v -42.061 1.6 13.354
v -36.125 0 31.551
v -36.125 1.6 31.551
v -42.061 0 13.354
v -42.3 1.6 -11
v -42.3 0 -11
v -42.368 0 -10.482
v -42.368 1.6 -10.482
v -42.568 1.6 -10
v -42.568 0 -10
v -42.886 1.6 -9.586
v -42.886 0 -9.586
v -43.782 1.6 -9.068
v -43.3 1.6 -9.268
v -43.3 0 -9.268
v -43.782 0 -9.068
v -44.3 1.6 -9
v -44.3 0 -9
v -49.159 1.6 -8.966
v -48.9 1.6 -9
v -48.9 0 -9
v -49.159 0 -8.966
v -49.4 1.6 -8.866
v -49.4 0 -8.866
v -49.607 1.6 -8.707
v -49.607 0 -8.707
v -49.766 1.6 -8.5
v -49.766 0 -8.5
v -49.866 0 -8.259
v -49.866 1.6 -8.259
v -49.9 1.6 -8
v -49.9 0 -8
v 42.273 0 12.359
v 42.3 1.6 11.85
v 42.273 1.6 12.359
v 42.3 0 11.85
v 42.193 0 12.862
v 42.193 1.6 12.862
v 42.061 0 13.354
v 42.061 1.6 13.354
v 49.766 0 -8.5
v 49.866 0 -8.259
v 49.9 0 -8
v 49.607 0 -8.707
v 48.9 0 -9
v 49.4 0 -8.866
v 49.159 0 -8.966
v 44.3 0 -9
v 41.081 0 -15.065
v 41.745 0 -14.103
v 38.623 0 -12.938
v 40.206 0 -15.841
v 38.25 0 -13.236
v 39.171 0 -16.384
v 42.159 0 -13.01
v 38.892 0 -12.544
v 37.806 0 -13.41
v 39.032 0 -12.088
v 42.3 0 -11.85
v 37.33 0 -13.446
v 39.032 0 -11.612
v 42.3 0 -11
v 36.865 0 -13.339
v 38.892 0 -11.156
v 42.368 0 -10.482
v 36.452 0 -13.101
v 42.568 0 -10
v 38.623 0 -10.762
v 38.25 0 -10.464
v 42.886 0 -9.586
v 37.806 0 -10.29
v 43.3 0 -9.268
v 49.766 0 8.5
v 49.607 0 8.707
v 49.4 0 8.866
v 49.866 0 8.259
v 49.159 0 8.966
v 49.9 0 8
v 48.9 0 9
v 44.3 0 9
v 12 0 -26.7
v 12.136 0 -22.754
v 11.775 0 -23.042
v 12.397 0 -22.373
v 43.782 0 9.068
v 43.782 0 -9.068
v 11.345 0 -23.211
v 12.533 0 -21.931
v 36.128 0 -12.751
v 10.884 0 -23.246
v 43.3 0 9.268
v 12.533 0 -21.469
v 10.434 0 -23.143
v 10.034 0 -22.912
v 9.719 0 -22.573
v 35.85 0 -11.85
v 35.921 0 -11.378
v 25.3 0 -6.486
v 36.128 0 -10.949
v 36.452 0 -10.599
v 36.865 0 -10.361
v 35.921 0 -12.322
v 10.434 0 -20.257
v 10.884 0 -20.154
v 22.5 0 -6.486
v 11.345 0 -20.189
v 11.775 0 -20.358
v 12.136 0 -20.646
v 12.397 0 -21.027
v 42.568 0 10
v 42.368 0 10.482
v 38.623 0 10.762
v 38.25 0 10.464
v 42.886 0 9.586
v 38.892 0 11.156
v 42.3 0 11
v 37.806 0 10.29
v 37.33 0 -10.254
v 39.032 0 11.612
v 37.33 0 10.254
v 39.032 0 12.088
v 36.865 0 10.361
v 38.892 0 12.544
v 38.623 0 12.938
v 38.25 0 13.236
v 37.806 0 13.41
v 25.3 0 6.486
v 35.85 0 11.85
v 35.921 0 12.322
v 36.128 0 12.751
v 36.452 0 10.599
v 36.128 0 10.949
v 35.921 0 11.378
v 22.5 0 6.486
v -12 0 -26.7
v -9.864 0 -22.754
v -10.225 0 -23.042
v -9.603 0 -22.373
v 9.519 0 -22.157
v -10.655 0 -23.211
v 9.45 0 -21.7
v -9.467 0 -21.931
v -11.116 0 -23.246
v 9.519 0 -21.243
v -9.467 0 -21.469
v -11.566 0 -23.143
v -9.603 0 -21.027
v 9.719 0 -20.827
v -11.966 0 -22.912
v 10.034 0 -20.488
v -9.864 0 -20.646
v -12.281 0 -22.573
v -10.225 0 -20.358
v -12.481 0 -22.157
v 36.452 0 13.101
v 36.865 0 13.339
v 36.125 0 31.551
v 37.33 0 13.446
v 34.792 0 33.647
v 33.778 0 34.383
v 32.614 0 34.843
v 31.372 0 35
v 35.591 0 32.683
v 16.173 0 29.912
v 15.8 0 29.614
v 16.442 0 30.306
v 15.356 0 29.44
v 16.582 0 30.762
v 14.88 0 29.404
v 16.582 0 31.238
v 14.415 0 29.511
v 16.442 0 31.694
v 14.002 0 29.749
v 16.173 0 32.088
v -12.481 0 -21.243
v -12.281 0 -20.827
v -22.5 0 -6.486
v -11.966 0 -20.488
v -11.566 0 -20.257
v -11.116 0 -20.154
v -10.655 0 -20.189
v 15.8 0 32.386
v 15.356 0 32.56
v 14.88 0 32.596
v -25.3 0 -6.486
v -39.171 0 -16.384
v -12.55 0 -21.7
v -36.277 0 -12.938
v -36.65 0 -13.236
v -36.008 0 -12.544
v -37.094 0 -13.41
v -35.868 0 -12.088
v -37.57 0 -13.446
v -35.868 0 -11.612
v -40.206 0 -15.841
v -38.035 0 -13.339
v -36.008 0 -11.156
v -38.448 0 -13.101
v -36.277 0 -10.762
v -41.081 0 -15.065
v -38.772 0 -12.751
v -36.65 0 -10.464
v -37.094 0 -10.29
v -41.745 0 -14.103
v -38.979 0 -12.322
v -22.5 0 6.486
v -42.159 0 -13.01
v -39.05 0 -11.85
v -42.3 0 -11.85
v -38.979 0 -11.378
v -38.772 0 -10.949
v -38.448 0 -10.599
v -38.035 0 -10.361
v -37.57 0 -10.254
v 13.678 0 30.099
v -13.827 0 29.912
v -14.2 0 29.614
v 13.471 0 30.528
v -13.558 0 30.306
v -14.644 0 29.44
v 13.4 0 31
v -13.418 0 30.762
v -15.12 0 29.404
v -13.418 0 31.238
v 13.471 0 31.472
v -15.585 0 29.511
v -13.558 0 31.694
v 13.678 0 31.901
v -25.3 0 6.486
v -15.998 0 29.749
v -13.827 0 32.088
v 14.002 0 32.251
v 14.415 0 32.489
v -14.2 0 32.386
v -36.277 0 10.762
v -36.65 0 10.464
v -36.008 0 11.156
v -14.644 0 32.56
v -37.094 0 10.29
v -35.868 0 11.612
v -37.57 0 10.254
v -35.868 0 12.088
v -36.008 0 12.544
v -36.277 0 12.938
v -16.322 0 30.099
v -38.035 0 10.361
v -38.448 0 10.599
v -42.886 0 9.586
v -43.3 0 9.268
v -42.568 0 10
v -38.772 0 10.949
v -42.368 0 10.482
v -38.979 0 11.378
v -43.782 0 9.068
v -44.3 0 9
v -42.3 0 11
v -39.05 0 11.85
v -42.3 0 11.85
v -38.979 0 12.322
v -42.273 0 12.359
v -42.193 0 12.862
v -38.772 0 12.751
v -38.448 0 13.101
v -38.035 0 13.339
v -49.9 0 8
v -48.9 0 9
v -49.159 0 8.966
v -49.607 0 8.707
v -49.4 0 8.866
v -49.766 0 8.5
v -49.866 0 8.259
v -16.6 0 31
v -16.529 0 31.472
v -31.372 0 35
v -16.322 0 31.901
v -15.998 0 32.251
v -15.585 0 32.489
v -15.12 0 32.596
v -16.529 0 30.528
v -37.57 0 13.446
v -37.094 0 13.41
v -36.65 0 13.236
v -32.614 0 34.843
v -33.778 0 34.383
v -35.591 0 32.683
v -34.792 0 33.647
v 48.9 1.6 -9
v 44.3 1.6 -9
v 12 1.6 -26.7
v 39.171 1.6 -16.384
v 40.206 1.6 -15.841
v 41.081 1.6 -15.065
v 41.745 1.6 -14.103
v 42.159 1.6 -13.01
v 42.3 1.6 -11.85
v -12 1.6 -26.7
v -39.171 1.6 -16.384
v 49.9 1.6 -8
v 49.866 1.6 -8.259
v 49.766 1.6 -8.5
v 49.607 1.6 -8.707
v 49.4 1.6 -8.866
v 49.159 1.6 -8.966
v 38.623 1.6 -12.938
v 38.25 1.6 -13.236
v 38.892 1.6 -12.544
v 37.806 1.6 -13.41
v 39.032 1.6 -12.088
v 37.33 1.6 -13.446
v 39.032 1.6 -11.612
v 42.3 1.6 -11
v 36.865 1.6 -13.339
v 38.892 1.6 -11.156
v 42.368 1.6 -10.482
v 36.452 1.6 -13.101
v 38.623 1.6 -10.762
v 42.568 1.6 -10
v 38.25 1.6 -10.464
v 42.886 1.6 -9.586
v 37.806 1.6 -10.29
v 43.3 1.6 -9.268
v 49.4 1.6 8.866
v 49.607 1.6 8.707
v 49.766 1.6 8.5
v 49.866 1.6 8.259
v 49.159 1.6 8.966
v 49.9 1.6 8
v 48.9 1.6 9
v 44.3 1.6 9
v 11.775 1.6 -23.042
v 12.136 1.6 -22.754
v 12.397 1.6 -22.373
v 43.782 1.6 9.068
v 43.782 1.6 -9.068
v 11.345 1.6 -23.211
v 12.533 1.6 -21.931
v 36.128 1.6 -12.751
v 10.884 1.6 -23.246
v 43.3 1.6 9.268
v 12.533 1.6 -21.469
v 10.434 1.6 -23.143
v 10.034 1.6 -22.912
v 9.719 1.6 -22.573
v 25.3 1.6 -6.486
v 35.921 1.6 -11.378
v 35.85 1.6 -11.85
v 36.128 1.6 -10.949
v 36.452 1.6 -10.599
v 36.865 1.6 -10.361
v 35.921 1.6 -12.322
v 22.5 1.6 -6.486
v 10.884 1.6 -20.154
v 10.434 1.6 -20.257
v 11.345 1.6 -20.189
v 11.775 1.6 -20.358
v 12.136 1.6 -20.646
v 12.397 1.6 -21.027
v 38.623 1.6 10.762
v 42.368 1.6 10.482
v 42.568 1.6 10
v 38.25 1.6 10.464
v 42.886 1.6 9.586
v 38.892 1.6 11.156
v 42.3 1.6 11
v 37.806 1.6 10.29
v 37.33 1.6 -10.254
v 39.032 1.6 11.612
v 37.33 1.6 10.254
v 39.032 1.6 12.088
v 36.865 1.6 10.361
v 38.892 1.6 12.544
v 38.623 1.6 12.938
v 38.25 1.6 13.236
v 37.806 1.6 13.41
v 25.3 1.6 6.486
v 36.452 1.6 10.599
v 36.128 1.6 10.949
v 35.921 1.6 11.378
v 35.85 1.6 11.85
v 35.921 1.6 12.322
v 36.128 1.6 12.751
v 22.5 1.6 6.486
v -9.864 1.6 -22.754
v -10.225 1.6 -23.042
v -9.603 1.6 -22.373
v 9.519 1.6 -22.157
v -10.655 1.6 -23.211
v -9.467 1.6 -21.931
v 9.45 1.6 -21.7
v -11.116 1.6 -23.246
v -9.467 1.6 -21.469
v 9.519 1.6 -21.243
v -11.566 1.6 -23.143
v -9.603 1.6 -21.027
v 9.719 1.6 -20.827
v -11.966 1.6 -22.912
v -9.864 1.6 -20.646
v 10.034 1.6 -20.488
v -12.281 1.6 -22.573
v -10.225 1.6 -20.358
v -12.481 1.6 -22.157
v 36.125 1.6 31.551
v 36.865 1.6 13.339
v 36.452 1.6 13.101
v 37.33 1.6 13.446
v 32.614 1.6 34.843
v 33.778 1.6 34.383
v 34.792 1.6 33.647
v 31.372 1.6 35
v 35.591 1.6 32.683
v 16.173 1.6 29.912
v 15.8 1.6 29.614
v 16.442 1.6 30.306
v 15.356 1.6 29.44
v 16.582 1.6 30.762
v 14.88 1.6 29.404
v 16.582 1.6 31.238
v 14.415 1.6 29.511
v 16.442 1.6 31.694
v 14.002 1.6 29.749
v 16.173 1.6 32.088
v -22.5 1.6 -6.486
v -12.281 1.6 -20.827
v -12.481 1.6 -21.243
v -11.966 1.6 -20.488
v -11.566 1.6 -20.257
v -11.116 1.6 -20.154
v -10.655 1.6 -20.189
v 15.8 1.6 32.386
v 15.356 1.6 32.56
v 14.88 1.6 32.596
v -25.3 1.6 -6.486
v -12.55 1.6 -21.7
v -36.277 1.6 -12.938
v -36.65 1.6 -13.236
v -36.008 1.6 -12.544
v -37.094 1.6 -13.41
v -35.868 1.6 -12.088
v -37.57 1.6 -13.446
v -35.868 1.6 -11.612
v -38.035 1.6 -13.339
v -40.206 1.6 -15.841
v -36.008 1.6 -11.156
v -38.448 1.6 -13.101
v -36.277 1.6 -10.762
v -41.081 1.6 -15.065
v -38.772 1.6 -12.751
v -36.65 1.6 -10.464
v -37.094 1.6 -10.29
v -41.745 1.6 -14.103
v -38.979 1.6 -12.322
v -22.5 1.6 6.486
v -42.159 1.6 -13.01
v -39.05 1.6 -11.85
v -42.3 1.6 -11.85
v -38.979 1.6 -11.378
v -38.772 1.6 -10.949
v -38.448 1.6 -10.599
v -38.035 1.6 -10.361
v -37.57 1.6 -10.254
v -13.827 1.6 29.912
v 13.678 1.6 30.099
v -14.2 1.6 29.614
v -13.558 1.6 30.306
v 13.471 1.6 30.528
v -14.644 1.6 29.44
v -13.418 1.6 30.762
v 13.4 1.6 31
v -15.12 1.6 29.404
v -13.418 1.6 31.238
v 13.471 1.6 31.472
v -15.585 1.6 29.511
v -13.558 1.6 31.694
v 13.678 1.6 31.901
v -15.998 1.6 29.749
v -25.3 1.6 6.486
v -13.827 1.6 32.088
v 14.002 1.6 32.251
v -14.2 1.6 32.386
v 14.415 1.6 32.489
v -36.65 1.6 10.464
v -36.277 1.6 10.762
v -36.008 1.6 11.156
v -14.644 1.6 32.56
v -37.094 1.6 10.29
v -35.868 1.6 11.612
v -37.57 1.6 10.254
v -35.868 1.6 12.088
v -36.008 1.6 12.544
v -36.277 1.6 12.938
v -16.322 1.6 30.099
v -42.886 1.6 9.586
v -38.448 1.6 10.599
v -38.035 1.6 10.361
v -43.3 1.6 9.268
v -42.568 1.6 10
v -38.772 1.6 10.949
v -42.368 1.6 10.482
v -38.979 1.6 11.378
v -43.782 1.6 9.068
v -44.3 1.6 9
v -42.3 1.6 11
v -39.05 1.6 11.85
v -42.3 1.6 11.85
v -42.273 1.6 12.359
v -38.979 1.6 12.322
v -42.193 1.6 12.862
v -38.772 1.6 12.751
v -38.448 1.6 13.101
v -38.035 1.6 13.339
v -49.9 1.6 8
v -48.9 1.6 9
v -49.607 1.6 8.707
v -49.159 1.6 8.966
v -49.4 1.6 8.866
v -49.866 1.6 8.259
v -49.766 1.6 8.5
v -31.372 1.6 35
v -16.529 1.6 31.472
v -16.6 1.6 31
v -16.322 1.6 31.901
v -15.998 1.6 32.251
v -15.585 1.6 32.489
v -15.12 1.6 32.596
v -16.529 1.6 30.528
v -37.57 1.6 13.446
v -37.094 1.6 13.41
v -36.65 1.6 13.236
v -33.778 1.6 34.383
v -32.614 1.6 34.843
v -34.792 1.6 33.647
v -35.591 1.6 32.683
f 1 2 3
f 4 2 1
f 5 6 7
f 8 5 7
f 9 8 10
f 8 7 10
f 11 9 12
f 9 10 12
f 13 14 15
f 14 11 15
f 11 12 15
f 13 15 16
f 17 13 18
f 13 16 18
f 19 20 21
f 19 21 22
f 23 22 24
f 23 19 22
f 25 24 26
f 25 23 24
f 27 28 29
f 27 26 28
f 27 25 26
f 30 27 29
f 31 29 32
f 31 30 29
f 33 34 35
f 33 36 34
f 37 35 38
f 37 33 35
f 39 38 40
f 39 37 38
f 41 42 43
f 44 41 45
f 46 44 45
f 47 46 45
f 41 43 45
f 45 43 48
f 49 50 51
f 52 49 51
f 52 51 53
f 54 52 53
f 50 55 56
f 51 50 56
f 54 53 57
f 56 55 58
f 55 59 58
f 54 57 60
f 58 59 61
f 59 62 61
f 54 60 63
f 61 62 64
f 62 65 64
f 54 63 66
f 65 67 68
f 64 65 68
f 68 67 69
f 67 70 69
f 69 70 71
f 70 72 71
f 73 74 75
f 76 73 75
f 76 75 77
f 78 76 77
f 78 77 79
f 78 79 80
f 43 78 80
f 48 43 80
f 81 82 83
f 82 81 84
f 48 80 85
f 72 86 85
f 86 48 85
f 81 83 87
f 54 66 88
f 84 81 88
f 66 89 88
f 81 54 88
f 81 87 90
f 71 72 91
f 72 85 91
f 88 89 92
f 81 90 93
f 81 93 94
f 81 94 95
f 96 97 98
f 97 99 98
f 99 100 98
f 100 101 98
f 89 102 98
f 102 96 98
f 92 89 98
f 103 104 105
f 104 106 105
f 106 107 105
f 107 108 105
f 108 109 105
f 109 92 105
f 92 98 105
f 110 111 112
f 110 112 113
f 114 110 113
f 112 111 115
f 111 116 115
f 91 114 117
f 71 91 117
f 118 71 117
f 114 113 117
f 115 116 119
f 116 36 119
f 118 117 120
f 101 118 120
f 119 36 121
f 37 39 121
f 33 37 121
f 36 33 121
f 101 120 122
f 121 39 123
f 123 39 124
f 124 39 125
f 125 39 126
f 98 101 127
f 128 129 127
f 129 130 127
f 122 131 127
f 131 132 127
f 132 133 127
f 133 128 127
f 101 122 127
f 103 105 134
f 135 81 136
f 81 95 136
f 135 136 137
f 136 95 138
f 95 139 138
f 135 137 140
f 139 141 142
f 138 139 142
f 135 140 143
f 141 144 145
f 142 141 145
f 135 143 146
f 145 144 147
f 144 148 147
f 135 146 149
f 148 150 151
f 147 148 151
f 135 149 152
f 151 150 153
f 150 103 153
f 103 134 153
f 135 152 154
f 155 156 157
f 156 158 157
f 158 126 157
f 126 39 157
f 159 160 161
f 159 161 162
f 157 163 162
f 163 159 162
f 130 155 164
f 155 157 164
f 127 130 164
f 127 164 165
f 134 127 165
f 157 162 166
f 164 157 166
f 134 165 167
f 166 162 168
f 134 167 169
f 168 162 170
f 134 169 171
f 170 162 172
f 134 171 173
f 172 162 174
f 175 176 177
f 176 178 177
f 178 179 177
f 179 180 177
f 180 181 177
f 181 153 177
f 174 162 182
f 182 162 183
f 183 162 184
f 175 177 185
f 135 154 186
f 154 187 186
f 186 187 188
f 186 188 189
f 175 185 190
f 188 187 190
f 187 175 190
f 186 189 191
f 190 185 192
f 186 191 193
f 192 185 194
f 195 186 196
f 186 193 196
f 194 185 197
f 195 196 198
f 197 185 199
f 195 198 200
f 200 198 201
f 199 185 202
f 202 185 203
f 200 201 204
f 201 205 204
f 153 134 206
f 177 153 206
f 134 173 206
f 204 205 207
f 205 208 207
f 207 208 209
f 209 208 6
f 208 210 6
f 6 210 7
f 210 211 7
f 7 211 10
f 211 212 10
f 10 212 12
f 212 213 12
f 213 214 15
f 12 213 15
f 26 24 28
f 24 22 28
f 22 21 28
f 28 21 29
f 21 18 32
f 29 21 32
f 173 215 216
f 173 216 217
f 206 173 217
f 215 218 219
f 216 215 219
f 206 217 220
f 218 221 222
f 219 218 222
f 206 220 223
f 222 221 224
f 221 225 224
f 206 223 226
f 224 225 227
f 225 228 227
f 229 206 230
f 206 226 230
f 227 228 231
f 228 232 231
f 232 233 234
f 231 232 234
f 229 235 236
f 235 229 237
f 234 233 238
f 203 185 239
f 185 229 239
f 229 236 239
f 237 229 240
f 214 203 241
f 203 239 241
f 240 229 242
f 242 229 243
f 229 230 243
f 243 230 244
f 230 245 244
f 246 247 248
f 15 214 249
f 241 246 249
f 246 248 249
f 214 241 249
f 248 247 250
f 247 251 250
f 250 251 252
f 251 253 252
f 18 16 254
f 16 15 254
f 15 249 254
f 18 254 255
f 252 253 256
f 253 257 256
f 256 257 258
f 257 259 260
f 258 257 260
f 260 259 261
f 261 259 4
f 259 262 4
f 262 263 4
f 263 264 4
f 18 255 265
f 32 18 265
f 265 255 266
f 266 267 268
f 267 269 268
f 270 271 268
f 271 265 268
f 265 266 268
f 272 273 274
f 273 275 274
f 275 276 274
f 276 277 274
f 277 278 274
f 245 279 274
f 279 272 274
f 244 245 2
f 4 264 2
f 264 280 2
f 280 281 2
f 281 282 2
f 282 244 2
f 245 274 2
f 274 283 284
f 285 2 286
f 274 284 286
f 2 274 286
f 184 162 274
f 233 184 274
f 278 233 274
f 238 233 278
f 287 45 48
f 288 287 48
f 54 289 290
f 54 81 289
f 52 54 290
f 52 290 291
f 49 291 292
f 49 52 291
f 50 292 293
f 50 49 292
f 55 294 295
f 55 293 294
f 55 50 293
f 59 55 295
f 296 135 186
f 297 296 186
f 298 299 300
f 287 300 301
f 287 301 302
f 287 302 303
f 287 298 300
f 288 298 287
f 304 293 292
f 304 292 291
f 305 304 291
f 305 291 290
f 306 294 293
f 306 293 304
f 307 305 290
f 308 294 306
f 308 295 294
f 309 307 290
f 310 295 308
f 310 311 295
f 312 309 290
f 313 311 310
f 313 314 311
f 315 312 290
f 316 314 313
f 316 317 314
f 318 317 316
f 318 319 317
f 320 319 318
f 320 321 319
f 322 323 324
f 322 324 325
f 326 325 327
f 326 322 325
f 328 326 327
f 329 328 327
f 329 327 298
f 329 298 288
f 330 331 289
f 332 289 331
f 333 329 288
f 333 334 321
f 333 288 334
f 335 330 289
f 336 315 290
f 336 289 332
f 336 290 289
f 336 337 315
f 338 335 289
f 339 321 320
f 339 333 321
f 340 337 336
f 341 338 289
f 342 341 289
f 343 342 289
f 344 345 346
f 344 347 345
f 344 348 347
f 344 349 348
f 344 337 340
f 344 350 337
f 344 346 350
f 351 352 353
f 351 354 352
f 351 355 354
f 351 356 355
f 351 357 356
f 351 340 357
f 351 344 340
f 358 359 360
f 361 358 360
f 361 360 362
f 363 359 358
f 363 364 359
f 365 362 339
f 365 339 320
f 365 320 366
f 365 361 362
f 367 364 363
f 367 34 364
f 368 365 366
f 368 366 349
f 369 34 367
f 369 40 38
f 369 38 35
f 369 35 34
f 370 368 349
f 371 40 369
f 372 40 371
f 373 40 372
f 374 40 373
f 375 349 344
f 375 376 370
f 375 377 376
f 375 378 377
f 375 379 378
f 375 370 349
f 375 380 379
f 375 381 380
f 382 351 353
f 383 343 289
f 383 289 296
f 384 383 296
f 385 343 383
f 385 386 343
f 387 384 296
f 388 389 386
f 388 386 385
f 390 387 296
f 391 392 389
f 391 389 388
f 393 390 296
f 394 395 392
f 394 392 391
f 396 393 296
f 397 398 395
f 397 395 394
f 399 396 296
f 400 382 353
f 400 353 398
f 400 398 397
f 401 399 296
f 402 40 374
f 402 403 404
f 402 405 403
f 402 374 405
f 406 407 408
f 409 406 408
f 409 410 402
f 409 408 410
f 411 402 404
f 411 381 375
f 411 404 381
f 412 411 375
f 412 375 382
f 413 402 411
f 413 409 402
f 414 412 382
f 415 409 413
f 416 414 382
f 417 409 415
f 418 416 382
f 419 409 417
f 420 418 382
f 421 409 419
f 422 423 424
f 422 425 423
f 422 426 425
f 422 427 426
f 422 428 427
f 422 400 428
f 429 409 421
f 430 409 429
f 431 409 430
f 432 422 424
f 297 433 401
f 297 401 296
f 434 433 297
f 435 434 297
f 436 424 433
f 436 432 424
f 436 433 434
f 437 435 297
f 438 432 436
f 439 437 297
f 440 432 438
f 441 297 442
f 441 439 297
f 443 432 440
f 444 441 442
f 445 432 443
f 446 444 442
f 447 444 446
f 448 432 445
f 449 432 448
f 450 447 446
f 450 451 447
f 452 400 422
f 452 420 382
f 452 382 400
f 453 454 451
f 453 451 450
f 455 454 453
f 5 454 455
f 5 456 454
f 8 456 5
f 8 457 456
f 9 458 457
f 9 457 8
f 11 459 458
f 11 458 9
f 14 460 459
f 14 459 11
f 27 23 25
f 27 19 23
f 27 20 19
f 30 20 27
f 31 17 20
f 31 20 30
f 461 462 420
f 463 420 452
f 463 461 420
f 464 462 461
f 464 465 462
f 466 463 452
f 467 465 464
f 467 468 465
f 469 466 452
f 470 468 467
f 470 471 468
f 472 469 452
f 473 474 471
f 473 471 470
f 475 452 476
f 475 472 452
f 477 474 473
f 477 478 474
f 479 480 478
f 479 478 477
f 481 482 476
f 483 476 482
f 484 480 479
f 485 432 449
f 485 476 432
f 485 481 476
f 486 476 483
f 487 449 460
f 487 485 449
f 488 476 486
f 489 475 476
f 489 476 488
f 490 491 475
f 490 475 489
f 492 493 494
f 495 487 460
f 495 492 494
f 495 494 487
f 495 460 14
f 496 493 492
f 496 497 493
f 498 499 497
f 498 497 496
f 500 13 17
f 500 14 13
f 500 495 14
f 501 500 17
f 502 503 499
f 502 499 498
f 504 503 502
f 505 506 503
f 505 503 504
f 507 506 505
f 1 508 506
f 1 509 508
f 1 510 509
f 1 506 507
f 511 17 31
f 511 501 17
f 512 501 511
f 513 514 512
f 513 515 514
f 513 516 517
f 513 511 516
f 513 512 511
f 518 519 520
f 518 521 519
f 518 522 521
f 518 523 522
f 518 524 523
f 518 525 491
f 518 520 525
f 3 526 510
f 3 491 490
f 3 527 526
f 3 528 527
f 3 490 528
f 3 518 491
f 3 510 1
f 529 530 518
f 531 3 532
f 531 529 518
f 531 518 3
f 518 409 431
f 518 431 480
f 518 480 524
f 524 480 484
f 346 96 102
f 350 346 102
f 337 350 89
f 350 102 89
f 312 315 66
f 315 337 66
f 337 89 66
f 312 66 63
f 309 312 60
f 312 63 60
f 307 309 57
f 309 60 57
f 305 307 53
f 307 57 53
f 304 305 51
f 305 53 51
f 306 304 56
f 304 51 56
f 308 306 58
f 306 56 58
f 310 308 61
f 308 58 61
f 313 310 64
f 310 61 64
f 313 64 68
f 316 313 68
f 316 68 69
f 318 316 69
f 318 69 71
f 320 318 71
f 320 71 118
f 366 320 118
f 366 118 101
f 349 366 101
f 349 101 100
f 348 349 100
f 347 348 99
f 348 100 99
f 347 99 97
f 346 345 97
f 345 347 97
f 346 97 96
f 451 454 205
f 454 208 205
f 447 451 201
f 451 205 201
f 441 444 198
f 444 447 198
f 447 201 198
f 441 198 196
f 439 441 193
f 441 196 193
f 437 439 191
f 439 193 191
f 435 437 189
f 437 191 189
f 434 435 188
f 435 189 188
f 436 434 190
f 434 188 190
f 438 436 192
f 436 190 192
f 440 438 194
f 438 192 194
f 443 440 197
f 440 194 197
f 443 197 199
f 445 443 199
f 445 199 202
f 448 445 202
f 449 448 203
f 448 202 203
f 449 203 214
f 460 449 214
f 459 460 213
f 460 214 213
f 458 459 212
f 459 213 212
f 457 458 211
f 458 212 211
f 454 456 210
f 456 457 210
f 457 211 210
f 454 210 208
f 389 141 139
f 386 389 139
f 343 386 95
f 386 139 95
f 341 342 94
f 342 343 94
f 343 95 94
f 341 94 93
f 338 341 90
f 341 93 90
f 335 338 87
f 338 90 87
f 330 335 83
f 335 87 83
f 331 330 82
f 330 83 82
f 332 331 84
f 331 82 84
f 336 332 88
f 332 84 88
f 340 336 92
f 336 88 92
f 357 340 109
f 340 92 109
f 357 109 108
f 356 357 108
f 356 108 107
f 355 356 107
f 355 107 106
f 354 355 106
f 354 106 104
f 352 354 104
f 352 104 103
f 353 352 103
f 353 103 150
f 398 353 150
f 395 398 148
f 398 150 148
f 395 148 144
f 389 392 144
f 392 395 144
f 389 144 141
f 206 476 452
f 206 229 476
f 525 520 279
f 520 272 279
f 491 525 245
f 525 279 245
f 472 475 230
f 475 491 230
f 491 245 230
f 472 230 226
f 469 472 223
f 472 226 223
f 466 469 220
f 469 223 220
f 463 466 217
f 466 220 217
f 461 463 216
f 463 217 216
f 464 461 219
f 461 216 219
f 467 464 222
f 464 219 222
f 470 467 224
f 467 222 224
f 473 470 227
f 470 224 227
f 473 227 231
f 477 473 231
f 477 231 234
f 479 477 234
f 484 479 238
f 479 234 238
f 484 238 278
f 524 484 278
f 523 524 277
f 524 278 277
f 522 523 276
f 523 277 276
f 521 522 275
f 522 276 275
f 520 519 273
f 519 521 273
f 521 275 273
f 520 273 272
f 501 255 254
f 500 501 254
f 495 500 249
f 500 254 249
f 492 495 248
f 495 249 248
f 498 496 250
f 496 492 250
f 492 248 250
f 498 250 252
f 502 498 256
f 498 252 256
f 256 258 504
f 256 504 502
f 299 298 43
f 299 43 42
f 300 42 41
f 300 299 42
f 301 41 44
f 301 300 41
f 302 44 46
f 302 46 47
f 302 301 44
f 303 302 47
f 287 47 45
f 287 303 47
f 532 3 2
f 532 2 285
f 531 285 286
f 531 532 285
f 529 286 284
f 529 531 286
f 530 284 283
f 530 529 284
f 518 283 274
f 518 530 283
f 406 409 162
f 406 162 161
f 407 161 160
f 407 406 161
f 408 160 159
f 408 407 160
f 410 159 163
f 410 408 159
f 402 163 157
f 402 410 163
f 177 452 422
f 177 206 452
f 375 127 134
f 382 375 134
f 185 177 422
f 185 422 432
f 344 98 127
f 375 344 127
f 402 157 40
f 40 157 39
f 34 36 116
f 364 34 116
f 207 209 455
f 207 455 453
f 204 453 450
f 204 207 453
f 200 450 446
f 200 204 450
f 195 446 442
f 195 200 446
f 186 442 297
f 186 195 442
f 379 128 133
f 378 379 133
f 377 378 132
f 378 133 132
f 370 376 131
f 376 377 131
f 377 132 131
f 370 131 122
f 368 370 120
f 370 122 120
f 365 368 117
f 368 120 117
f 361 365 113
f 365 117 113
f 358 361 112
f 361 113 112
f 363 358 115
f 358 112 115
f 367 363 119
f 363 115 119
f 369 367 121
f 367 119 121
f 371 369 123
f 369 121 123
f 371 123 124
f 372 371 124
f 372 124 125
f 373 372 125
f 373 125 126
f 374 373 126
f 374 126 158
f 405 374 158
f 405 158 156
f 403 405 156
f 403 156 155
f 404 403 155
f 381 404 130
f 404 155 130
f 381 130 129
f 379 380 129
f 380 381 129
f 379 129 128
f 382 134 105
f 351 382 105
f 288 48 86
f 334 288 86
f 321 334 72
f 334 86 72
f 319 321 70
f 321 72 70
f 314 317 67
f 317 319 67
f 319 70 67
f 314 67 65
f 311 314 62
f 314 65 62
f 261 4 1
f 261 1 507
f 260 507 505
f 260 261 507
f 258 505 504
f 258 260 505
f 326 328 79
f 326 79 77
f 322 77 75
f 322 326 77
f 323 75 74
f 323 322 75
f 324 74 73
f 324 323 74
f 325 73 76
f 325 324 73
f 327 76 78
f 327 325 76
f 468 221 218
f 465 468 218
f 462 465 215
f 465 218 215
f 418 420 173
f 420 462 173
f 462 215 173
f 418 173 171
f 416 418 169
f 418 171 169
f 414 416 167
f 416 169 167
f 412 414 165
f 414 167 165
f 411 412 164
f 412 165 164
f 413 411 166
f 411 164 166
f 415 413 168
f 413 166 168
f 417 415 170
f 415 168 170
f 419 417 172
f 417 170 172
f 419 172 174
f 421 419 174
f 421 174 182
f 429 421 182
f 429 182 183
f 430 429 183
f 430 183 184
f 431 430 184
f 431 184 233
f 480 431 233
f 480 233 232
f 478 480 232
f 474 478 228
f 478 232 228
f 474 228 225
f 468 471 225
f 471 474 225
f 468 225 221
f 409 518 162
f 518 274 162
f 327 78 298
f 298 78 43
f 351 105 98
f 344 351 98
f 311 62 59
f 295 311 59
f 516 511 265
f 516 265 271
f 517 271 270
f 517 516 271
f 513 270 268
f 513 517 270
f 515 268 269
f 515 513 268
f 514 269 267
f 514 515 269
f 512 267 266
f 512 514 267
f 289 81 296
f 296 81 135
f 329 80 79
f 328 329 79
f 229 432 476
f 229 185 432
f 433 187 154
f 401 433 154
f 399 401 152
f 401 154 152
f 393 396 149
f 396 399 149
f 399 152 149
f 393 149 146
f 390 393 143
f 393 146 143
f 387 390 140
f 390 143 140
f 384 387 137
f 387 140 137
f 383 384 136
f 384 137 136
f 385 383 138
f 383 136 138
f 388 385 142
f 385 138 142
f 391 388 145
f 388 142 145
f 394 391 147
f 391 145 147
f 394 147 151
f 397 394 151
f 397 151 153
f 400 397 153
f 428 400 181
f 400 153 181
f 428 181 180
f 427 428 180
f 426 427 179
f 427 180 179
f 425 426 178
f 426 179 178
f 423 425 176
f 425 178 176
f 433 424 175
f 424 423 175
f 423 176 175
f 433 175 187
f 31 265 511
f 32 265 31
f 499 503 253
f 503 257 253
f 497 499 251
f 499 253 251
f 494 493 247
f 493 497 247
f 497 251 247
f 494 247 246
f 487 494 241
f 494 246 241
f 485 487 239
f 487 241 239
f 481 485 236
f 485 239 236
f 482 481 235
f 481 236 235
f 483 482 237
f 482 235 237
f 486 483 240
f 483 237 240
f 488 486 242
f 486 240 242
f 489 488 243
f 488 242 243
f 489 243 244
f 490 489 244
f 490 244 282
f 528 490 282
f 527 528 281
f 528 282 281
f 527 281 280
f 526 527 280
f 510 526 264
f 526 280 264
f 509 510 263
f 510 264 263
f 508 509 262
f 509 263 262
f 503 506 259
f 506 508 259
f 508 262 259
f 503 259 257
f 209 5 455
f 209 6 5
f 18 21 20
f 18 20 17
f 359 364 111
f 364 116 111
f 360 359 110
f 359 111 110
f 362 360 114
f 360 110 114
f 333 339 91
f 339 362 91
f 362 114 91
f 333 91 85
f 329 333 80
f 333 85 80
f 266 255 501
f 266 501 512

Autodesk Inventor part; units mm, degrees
ref_plane "YZ Plane" through (0, 0, 0) normal (1, 0, 0) x (0, 1, 0)
ref_plane "XZ Plane" through (0, 0, 0) normal (0, 1, 0) x (-1, 0, 0)
ref_plane "XY Plane" through (0, 0, 0) normal (0, 0, 1) x (1, 0, 0)
sketch "Szkic1" plane through (0, 0, 0) normal (0, 1, 0) x (-1, 0, 0)
  circle A0 centre (-37.45, -11.85) radius 1.6
  circle A1 centre (-11, -21.7) radius 1.55
  circle A2 centre (-15, 31) radius 1.6
  line L0 (-25.3, 6.4859) -> (-22.5, 6.4859)
  line L1 (-22.5, 6.4859) -> (-22.5, -6.4859)
  line L2 (-22.5, -6.4859) -> (-25.3, -6.4859)
  line L3 (-25.3, -6.4859) -> (-25.3, 6.4859)
  line L4 (-42.3, 11.85) -> (-42.3, 11)
  arc A3 (-44.3, 9) -> (-42.3, 11) centre (-44.3, 11) ccw
  line L5 (-44.3, 9) -> (-49.9, 9)
  line L6 (-49.9, 9) -> (-49.9, -9)
  line L7 (-49.9, -9) -> (-44.3, -9)
  arc A4 (-42.3, -11) -> (-44.3, -9) centre (-44.3, -11) ccw
  line L8 (-42.3, -11) -> (-42.3, -11.85)
  arc A5 (-42.3, -11.85) -> (-39.0298, -16.4355) centre (-37.45, -11.85) ccw
  line L9 (-12, -26.7) -> (12, -26.7)
  line L10 (35, 35) -> (-35, 35)
  line L11 (0, -26.7) -> (0, 35)
  line L12 (-49.9, 0) -> (-32, 0)
  circle A6 centre (-37.45, 11.85) radius 1.6
  arc A7 (-42.0609, 13.3541) -> (-42.3, 11.85) centre (-37.45, 11.85) ccw
  line L13 (-35, 35) -> (-42.0609, 13.3541)
  line L14 (-12, -26.7) -> (-39.1714, -16.3842)
  arc A8 (42.3, 11) -> (44.3, 9) centre (44.3, 11) ccw
  line L15 (25.3, 6.4859) -> (22.5, 6.4859)
  line L16 (44.3, 9) -> (49.9, 9)
  line L17 (22.5, 6.4859) -> (22.5, -6.4859)
  line L18 (25.3, -6.4859) -> (25.3, 6.4859)
  line L19 (49.9, 9) -> (49.9, -9)
  line L20 (22.5, -6.4859) -> (25.3, -6.4859)
  line L21 (49.9, -9) -> (44.3, -9)
  arc A9 (44.3, -9) -> (42.3, -11) centre (44.3, -11) ccw
  line L22 (42.3, -11) -> (42.3, -11.85)
  circle A10 centre (37.45, -11.85) radius 1.6
  arc A11 (39.0298, -16.4355) -> (42.3, -11.85) centre (37.45, -11.85) ccw
  circle A12 centre (11, -21.7) radius 1.55
  line L23 (42.3, 11.85) -> (42.3, 11)
  circle A13 centre (15, 31) radius 1.6
  line L24 (49.9, 0) -> (32, 0)
  circle A14 centre (37.45, 11.85) radius 1.6
  arc A15 (42.3, 11.85) -> (42.0609, 13.3541) centre (37.45, 11.85) ccw
  line L25 (35, 35) -> (42.0609, 13.3541)
  line L26 (12, -26.7) -> (39.1714, -16.3842)
  point P0 (0, 0)
  point P1 (-22.5, 0)
  point P2 (-39.0298, 16.4355)
  point P3 (22.5, 0)
  point P4 (39.0298, 16.4355)
  dimension "d5" = 12.9718
  dimension "d6" = 2.8
  dimension "d8" = 22.5
  dimension "d9" = 24
  dimension "d12" = 24.6
  dimension "d13" = 5.6
  dimension "d14" = 5.6
  dimension "d17" = 2.85
  dimension "d18" = 20.2141
  dimension "d19" = 35
extrude "Wyciągnięcie proste1" add sketch "Szkic1" along normal blind 1.6
fillet "Zaokrąglenie1" radius 5 2 edges at (-35, 0.8, 35) (35, 0.8, 35)
fillet "Zaokrąglenie3" radius 1 4 edges at (-49.9, 0.8, -9) (-49.9, 0.8, 9) (49.9, 0.8, 9) (49.9, 0.8, -9)
sketch "Szkic4" plane through (0, 1.6, 0) normal (0, 1, 0) x (1, 0, 0)
  arc A0 (49.9, 8) -> (48.9, 9) centre (48.9, 8) ccw projected
  line L0 (48.9, 9) -> (44.3, 9) projected
  arc A1 (42.3, 11) -> (44.3, 9) centre (44.3, 11) ccw projected
  line L1 (42.3, 11) -> (42.3, 11.85) projected
  arc A2 (42.3, 11.85) -> (39.1714, 16.3842) centre (37.45, 11.85) ccw projected
  line L2 (39.1714, 16.3842) -> (12, 26.7) projected
  line L3 (12, 26.7) -> (-12, 26.7) projected
  line L4 (-12, 26.7) -> (-39.1714, 16.3842) projected
  arc A3 (-39.1714, 16.3842) -> (-42.3, 11.85) centre (-37.45, 11.85) ccw projected
  line L5 (-42.3, 11.85) -> (-42.3, 11) projected
  arc A4 (-44.3, 9) -> (-42.3, 11) centre (-44.3, 11) ccw projected
  line L6 (-44.3, 9) -> (-48.9, 9) projected
  arc A5 (-48.9, 9) -> (-49.9, 8) centre (-48.9, 8) ccw projected
  line L7 (-49.9, 8) -> (-49.9, -8) projected
  arc A6 (-49.9, -8) -> (-48.9, -9) centre (-48.9, -8) ccw projected
  line L8 (-48.9, -9) -> (-44.3, -9) projected
  arc A7 (-42.3, -11) -> (-44.3, -9) centre (-44.3, -11) ccw projected
  line L9 (-42.3, -11) -> (-42.3, -11.85) projected
  arc A8 (-42.3, -11.85) -> (-42.0609, -13.3541) centre (-37.45, -11.85) ccw projected
  line L10 (-42.0609, -13.3541) -> (-36.1252, -31.5506) projected
  arc A9 (-36.1252, -31.5506) -> (-31.3717, -35) centre (-31.3717, -30) ccw projected
  line L11 (-31.3717, -35) -> (31.3717, -35) projected
  arc A10 (31.3717, -35) -> (36.1252, -31.5506) centre (31.3717, -30) ccw projected
  line L12 (36.1252, -31.5506) -> (42.0609, -13.3541) projected
  arc A11 (42.0609, -13.3541) -> (42.3, -11.85) centre (37.45, -11.85) ccw projected
  line L13 (42.3, -11.85) -> (42.3, -11) projected
  arc A12 (44.3, -9) -> (42.3, -11) centre (44.3, -11) ccw projected
  line L14 (44.3, -9) -> (48.9, -9) projected
  arc A13 (48.9, -9) -> (49.9, -8) centre (48.9, -8) ccw projected
  line L15 (49.9, -8) -> (49.9, 8) projected
  line L16 (25.3, -6.4859) -> (22.5, -6.4859) projected
  line L17 (22.5, -6.4859) -> (22.5, 6.4859) projected
  line L18 (22.5, 6.4859) -> (25.3, 6.4859) projected
  line L19 (25.3, 6.4859) -> (25.3, -6.4859) projected
  circle A14 centre (37.45, 11.85) radius 1.6 projected
  circle A15 centre (11, 21.7) radius 1.55 projected
  circle A16 centre (37.45, -11.85) radius 1.6 projected
  circle A17 centre (15, -31) radius 1.6 projected
  circle A18 centre (-15, -31) radius 1.6 projected
  circle A19 centre (-37.45, 11.85) radius 1.6 projected
  circle A20 centre (-37.45, -11.85) radius 1.6 projected
  circle A21 centre (-11, 21.7) radius 1.55 projected
  line L20 (-25.3, -6.4859) -> (-25.3, 6.4859) projected
  line L21 (-25.3, 6.4859) -> (-22.5, 6.4859) projected
  line L22 (-22.5, 6.4859) -> (-22.5, -6.4859) projected
  line L23 (-22.5, -6.4859) -> (-25.3, -6.4859) projected
  point P0 (0, 0)
properties part number "plytka_glowna"
